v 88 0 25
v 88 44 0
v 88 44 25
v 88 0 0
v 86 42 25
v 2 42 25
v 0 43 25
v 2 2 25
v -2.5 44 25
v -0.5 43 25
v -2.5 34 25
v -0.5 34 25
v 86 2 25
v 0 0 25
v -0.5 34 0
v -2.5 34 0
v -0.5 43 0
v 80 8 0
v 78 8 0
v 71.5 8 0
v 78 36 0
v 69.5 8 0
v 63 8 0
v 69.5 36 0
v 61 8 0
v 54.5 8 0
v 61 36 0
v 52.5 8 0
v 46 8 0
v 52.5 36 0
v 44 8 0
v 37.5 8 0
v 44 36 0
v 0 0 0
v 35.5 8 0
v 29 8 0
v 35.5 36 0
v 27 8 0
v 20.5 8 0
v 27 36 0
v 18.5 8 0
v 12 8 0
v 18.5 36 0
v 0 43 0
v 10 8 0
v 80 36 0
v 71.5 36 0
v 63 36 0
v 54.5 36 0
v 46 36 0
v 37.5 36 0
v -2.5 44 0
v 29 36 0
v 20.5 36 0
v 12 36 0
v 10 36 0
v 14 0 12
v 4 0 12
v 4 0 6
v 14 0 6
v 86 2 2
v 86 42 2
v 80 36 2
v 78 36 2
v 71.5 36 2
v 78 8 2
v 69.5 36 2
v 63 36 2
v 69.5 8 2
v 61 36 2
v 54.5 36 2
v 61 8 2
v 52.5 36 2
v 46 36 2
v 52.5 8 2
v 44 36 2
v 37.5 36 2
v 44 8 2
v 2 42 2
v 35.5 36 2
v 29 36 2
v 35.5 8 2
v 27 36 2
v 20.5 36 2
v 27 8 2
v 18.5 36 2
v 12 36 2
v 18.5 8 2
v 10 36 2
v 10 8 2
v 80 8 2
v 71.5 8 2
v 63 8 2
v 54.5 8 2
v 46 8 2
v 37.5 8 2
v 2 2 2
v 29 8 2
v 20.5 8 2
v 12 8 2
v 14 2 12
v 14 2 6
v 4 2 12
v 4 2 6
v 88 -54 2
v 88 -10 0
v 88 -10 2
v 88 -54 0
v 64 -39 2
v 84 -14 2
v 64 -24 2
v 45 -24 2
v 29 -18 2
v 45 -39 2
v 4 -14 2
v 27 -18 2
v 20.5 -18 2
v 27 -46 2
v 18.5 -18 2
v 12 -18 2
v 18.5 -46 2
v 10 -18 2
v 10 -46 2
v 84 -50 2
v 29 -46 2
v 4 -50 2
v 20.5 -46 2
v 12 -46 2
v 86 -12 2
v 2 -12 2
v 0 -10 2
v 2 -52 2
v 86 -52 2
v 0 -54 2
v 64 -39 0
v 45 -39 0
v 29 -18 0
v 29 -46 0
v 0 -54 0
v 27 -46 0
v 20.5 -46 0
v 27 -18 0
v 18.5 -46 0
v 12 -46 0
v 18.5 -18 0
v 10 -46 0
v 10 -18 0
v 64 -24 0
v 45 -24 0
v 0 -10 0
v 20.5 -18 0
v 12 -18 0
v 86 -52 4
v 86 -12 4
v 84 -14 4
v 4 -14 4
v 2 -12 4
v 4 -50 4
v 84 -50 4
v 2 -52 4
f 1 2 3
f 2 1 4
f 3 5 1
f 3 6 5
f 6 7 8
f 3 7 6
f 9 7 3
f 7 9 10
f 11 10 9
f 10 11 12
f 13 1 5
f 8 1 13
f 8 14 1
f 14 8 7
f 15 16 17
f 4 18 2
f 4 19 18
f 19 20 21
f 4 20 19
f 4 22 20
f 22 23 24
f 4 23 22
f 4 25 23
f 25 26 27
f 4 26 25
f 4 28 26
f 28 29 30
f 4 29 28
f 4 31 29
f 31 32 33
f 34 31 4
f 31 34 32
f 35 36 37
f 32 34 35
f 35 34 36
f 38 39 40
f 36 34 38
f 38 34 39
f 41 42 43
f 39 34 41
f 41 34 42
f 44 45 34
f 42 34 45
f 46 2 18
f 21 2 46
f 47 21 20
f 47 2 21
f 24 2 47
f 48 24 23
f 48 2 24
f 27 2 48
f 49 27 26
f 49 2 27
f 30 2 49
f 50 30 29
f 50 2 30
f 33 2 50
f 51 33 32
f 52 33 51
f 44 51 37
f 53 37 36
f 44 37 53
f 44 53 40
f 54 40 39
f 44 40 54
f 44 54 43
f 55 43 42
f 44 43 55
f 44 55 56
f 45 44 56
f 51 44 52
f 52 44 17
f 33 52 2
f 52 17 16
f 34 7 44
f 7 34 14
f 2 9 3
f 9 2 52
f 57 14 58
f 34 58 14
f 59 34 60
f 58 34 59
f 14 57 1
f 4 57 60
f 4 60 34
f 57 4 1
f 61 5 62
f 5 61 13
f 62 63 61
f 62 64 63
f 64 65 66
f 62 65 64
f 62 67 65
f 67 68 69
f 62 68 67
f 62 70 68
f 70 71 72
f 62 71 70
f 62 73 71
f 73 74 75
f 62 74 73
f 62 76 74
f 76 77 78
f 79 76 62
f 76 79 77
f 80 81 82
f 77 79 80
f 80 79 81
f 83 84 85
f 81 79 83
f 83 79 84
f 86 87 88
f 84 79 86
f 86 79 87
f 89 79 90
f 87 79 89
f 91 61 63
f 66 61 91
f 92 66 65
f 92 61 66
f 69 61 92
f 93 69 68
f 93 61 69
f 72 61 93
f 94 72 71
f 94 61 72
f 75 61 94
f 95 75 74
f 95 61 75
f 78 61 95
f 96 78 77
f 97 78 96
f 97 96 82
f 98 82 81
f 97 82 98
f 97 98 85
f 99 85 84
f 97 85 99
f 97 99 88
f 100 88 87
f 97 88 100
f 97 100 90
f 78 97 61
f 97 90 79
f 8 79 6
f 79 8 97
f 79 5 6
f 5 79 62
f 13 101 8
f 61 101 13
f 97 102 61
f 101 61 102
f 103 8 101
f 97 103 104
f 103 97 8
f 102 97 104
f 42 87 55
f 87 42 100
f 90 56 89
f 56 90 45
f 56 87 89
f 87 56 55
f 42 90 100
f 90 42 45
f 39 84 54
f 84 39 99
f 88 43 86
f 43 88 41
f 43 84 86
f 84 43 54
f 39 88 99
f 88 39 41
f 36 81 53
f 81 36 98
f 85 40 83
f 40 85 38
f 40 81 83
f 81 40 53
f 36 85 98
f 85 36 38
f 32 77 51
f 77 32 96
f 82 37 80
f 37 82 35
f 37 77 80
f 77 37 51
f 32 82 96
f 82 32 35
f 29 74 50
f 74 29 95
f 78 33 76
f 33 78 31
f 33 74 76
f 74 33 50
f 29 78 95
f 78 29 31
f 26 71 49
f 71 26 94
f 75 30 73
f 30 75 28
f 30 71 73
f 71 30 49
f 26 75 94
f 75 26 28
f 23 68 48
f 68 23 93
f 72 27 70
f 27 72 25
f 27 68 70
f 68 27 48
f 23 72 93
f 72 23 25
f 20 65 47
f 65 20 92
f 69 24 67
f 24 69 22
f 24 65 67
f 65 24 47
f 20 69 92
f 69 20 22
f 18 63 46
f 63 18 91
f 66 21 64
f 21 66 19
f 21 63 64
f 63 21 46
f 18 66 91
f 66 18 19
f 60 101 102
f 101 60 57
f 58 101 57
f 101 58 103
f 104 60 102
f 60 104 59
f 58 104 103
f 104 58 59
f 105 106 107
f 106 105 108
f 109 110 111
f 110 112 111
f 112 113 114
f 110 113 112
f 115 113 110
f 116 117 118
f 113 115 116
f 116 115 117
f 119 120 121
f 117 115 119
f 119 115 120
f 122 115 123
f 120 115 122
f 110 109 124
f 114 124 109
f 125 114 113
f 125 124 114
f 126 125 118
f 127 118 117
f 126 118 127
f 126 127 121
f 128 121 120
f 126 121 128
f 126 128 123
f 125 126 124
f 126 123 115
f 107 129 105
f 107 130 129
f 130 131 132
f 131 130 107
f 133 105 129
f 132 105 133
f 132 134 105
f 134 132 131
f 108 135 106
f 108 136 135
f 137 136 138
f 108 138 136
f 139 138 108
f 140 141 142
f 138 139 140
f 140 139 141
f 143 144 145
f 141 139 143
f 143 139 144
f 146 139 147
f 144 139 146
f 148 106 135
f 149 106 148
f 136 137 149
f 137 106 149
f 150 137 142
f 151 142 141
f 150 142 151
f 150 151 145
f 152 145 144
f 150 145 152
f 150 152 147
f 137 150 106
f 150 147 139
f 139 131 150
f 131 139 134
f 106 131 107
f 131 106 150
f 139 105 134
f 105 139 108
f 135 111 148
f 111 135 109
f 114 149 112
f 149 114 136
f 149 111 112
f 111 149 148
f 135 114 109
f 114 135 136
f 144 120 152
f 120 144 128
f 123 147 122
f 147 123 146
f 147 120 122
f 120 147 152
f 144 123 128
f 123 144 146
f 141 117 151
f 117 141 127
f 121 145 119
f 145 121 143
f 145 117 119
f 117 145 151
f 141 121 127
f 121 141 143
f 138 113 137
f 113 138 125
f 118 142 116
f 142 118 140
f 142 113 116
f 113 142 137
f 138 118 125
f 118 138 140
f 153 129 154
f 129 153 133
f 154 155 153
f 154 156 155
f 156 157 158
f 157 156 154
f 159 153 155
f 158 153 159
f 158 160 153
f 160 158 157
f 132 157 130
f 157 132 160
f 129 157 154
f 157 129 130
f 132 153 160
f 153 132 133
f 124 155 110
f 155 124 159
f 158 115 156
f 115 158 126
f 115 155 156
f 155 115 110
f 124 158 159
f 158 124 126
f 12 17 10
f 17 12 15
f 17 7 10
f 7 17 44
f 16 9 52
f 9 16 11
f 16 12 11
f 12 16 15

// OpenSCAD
wall_thickness = 2;
base_width = 88;
base_depth = 44;
case_height = 25;
gaggia_steel_thickness = 0.5;
slitcount = 8;
slitwidth = 2;


/*
*   Definition of body. 
*/

module base()
{
  cube([base_width,base_depth, case_height]);
}

module interior()
{
  cube([base_width-4,base_depth-4,case_height]);
}

module base_block() {
  difference() {
    base();
    translate([wall_thickness,wall_thickness,wall_thickness])
        interior();
  }
}

module bottom_slits() {    
    gap = ((base_width - (10 * wall_thickness) - (slitcount*slitwidth))) / slitcount;
    for (i = [0:8]){
       translate([(5*wall_thickness)+(i*(gap+slitwidth)), (4 * wall_thickness), -1])
       cube([2, base_depth - (8 * wall_thickness), wall_thickness + 2]);
    }
}

module cable_inlet()
{
    cube([10,4,6]);
}

module slitted_lower_part()
{
    difference(){
        base_block();
        bottom_slits();
        }
}

module hook()
{
    translate([-gaggia_steel_thickness, base_depth - 1, 0])
    {
        cube([gaggia_steel_thickness, 1, case_height]);
    }
    translate([-gaggia_steel_thickness - wall_thickness, base_depth - 10, 0])
    {
        cube([wall_thickness, 10, case_height]);
    }

}



module complete_lower_part()
{
    difference(){
        slitted_lower_part();
        translate([4,-1,6])
        {
            cable_inlet();
        }
    }
}

/*
* Lid definition starts here
*/

module lid_body()
{

        cube([base_width,base_depth, wall_thickness]);
}


module top_slits() {    
    gap = ((base_width - (10 * wall_thickness) - (slitcount*slitwidth))) / slitcount;
    for (i = [0:2]){
       translate([(5*wall_thickness)+(i*(gap+slitwidth)), (4 * wall_thickness), -1])
       cube([2, base_depth - (8 * wall_thickness), wall_thickness + 2]);
    }
}

module display_window()
{
    cube([19,15,5]);
}

module snap_frame()
{
    difference(){
        cube([base_width - wall_thickness*2,base_depth  - wall_thickness*2, wall_thickness]);
        translate([wall_thickness, wall_thickness, -1]){   
            cube([base_width - wall_thickness*4,base_depth  - wall_thickness*4, wall_thickness +2]);
        }
    }
}


module lid()
{
    difference()
    {
        difference()
        {
            lid_body();
              translate([43+wall_thickness, 13+wall_thickness, -1])
            {   
                display_window();
            }
     
        }
        top_slits();
    }
    translate([wall_thickness, wall_thickness, wall_thickness])
    {
        snap_frame();
    }
}

//slits();

complete_lower_part();

translate([0, -base_depth - 10, 0])
{
    lid();
}

hook();
